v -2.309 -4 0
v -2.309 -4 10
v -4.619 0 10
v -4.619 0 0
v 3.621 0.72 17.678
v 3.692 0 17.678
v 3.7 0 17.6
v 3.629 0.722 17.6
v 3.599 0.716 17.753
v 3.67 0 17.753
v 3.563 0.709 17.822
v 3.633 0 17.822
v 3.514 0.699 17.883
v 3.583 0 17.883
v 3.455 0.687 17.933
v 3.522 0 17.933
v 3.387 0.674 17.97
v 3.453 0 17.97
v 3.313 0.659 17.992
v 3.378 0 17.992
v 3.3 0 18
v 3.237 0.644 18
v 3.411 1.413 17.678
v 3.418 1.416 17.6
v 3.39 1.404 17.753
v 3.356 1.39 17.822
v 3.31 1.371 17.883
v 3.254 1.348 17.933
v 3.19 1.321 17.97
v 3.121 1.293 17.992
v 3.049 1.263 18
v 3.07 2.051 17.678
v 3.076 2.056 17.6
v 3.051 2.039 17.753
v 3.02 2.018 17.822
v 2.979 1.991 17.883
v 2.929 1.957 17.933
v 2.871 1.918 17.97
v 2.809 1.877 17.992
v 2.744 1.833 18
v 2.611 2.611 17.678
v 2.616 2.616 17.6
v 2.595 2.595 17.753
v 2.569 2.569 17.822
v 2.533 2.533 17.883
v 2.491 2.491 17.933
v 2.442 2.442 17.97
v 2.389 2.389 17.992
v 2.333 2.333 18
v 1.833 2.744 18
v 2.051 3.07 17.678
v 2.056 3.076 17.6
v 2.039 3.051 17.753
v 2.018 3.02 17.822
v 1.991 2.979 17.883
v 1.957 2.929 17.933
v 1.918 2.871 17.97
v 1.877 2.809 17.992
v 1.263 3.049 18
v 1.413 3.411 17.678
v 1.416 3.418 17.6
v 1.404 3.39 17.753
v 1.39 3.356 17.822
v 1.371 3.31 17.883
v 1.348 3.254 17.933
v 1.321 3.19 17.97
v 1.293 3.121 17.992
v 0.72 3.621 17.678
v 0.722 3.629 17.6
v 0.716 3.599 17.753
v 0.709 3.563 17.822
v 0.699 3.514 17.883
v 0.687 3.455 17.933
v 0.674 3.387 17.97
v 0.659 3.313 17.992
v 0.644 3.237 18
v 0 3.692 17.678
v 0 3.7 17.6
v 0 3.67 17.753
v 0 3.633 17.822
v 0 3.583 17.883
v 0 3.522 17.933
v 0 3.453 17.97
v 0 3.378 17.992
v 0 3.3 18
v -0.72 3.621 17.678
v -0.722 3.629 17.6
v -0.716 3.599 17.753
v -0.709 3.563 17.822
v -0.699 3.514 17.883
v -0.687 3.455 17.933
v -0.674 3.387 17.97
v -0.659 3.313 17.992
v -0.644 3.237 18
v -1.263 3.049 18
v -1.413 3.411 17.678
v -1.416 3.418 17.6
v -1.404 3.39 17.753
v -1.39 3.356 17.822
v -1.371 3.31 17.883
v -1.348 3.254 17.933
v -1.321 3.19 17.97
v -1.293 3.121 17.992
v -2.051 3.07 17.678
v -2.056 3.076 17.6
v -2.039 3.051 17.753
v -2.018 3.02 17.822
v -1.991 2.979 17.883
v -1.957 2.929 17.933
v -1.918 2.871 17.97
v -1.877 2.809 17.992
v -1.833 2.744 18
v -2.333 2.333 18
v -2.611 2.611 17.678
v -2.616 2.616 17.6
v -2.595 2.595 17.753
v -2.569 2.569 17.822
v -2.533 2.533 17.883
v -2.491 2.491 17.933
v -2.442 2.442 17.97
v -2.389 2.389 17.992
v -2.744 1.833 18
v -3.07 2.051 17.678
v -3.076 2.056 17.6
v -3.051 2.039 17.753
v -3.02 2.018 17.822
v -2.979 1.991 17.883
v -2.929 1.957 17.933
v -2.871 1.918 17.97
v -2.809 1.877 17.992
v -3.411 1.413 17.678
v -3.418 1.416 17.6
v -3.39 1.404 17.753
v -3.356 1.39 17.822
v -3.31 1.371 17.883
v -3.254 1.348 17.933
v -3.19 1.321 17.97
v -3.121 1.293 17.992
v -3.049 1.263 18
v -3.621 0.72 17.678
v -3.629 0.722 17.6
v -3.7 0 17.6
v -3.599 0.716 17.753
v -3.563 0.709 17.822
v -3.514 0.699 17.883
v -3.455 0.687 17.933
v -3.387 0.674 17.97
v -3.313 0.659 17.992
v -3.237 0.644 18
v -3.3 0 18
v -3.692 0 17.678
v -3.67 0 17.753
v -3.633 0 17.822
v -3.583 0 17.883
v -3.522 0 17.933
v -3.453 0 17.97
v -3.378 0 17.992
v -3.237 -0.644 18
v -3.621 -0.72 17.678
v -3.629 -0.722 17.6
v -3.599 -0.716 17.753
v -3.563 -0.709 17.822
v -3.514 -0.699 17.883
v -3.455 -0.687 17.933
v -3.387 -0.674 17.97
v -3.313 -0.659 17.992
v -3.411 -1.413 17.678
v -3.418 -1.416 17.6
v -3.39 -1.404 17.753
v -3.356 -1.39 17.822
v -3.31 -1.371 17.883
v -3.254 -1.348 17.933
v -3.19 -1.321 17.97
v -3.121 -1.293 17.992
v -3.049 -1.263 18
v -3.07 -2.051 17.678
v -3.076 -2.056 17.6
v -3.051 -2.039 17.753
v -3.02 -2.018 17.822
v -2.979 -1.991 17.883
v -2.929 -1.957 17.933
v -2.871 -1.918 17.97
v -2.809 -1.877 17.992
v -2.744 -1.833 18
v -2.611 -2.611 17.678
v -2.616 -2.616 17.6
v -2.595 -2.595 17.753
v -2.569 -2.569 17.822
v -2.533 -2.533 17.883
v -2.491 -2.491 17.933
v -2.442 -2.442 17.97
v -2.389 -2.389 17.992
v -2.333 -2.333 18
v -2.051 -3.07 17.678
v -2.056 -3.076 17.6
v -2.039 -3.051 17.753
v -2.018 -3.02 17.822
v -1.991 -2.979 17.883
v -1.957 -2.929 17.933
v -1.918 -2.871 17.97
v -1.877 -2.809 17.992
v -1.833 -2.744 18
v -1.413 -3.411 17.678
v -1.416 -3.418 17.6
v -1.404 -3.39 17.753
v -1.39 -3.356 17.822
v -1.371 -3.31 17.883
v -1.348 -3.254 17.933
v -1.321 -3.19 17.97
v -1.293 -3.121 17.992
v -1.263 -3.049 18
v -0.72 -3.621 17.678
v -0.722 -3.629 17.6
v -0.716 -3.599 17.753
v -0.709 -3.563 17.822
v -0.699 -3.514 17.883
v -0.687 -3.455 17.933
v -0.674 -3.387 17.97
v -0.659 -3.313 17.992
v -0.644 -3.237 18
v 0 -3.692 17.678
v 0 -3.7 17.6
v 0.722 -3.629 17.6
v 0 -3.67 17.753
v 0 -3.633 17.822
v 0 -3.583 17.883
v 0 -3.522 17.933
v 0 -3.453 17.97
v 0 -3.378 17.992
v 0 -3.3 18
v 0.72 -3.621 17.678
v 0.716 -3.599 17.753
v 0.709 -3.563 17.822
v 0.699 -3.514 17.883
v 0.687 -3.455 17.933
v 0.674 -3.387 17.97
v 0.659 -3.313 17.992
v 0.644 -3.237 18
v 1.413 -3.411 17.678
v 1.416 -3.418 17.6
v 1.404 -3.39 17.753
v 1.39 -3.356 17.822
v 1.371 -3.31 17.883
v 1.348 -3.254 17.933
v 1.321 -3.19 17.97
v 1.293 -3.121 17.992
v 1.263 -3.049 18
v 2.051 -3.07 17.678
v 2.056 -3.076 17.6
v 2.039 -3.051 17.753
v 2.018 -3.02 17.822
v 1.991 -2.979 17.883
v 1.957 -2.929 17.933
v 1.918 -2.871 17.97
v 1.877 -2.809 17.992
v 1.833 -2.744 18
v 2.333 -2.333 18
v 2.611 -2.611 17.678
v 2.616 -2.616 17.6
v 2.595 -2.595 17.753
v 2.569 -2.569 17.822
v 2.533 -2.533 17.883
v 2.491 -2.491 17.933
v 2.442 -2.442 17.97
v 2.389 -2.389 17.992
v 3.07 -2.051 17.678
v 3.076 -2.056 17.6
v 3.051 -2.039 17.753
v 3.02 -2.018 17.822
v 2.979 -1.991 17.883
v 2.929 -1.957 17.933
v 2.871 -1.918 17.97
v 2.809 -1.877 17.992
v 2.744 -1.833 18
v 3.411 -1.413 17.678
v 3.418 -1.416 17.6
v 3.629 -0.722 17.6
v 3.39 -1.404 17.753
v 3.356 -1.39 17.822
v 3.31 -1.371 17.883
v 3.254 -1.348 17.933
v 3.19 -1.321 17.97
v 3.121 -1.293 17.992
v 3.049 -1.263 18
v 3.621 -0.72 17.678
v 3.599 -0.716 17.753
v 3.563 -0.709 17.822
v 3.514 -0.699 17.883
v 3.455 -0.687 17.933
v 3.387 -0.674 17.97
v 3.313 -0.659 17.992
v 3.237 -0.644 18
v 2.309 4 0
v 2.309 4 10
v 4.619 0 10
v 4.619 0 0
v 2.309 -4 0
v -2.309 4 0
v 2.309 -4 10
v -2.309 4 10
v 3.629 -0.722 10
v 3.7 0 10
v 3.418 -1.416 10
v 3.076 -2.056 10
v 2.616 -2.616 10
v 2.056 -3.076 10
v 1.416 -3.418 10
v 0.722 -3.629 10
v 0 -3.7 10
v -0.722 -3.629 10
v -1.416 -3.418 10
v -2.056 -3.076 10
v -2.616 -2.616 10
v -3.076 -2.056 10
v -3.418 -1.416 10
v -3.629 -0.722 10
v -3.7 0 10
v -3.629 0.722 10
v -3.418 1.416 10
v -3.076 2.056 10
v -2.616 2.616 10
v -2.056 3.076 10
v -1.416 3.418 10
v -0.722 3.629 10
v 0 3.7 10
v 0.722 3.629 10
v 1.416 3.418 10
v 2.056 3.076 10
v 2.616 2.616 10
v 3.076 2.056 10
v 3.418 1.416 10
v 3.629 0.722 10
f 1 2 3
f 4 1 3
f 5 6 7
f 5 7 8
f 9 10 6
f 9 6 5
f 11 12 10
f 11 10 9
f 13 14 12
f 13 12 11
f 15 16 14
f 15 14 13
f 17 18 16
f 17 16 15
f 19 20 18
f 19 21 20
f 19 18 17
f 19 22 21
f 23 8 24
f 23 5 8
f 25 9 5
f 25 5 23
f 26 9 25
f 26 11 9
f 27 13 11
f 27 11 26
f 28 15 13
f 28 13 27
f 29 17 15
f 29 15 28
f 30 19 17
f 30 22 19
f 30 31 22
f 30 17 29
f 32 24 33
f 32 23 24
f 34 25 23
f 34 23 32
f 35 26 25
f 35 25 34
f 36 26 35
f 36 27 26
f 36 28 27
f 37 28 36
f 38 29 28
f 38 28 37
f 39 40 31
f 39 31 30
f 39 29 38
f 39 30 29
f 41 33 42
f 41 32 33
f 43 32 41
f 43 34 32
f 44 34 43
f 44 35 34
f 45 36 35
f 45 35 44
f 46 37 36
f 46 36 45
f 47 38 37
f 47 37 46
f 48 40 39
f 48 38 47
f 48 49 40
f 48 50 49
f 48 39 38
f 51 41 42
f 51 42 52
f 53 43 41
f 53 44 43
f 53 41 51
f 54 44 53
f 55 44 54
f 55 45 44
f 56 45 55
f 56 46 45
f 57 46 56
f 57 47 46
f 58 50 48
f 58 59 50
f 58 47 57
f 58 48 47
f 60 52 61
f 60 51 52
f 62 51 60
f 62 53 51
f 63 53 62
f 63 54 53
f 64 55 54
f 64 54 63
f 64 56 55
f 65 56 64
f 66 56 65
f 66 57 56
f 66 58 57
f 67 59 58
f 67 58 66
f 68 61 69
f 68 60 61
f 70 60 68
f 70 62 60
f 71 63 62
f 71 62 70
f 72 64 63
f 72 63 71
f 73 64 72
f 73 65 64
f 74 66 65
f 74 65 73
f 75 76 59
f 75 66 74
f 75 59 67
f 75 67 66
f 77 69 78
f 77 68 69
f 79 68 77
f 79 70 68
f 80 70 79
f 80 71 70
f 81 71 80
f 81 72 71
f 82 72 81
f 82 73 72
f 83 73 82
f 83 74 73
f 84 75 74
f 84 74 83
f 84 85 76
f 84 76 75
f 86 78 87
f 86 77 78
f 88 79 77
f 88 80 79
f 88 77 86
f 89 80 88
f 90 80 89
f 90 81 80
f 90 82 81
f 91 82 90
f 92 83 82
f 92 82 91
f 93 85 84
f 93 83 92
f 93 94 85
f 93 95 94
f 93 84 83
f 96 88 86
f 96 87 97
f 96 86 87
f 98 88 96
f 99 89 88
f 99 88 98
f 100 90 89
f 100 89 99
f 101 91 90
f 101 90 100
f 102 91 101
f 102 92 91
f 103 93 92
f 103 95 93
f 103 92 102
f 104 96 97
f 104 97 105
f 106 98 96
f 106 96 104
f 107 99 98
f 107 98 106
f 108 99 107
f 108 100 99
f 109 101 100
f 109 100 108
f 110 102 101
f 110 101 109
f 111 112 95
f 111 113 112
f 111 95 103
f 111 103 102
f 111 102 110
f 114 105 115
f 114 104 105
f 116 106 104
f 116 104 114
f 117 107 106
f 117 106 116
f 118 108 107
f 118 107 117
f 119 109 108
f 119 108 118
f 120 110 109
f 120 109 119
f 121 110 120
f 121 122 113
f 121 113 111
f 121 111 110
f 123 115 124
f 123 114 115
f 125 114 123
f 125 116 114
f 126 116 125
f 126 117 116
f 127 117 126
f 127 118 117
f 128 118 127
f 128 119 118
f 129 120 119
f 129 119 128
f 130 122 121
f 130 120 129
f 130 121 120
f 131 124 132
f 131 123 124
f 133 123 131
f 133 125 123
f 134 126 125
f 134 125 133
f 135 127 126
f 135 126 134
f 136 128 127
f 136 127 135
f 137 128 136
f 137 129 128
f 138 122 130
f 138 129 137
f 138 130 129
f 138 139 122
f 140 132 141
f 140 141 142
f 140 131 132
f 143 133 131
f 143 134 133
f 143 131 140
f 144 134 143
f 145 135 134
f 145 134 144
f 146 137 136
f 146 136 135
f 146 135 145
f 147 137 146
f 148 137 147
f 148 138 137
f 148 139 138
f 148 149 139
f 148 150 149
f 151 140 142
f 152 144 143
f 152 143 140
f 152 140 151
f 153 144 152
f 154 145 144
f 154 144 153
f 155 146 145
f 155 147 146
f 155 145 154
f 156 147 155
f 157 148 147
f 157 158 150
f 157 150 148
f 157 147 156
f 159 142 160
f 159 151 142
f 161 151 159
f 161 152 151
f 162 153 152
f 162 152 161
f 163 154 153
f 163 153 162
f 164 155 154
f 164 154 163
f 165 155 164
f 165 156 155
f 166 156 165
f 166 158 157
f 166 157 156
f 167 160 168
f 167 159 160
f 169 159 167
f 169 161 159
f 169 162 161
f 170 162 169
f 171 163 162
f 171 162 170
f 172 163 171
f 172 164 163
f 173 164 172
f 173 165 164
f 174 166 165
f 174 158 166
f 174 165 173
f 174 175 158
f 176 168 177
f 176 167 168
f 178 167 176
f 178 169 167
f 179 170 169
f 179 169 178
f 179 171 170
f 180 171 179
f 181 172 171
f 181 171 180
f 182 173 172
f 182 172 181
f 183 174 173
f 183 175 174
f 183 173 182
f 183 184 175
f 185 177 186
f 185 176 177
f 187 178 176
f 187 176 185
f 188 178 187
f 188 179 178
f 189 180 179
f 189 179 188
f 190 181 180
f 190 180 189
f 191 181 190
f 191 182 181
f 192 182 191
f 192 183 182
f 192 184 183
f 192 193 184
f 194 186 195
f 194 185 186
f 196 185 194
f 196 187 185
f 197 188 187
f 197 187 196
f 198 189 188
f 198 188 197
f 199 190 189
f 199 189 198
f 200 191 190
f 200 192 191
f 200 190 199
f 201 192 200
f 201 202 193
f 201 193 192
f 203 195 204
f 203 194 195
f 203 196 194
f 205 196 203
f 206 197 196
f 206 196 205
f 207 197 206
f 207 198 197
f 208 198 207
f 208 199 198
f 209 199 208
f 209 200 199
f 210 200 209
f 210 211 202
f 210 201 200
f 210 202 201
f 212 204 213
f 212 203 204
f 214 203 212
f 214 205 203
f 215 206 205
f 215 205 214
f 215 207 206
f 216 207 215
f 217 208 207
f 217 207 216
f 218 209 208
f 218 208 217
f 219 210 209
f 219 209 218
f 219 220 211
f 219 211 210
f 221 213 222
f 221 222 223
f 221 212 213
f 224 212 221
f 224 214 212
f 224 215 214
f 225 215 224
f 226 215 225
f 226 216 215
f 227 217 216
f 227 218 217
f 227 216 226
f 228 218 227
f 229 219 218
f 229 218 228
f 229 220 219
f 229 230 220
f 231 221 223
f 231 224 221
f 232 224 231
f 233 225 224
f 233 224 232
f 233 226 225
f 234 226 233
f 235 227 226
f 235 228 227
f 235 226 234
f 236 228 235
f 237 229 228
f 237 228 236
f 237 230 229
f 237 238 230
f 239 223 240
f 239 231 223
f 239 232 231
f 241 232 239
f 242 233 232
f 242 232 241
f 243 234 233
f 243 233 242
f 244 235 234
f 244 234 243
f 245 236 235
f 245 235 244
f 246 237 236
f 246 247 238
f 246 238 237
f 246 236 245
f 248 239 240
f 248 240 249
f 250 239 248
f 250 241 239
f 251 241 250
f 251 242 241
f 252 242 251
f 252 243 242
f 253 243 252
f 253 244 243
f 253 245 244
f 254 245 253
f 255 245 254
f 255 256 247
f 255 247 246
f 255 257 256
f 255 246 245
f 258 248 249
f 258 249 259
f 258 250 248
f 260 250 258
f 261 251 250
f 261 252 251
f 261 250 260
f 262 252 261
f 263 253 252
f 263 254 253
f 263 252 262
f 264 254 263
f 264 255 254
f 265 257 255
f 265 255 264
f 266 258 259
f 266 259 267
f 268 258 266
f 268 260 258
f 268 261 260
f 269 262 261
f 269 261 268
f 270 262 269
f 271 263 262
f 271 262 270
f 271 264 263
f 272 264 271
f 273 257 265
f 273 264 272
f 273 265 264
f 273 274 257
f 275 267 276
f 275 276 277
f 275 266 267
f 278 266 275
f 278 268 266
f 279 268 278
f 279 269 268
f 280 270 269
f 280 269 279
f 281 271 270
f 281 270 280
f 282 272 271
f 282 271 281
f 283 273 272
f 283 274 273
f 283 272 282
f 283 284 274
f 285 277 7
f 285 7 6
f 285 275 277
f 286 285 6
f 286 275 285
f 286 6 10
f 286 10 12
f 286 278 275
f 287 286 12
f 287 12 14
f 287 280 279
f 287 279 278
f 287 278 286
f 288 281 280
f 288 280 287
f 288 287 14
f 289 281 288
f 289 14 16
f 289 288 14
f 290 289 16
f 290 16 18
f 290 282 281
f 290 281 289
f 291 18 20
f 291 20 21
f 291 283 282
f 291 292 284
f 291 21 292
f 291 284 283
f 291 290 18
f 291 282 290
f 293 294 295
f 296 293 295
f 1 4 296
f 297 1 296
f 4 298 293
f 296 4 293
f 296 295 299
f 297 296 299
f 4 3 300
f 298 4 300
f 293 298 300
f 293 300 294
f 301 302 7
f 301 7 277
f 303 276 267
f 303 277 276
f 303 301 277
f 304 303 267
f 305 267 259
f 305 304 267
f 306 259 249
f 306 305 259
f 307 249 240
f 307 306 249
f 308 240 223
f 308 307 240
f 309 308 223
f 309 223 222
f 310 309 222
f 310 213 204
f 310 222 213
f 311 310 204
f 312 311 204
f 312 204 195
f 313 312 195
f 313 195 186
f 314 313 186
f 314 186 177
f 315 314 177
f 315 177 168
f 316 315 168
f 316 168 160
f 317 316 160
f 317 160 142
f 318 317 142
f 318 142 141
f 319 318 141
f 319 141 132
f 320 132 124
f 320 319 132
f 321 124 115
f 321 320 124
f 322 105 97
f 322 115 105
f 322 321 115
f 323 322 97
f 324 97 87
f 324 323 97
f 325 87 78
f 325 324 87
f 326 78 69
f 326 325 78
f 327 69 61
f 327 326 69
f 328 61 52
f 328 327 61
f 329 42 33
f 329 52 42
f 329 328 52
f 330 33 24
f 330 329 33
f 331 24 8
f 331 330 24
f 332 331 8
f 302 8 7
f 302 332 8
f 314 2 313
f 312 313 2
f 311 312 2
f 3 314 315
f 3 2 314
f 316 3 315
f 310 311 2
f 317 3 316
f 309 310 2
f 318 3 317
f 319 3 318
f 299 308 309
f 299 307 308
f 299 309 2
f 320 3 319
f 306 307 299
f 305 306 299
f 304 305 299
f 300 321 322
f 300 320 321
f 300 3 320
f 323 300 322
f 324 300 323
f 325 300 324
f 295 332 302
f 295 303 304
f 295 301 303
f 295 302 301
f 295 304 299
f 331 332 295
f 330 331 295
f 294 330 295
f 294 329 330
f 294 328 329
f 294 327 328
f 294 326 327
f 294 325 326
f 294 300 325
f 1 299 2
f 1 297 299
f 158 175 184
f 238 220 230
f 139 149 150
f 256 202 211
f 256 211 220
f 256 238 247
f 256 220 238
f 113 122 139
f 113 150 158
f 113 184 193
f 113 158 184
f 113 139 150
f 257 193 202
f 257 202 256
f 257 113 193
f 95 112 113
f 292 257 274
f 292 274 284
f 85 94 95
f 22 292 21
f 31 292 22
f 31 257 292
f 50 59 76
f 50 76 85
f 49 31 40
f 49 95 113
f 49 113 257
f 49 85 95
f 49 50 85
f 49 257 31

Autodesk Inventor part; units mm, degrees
ref_plane "YZ Plane" through (0, 0, 0) normal (1, 0, 0) x (0, 1, 0)
ref_plane "XZ Plane" through (0, 0, 0) normal (0, 1, 0) x (-1, 0, 0)
ref_plane "XY Plane" through (0, 0, 0) normal (0, 0, 1) x (1, 0, 0)
sketch "Sketch1" plane through (0, 0, 0) normal (0, 0, 1) x (1, 0, 0)
  line L0 (2.3094, -4) -> (-2.3094, -4)
  line L1 (-2.3094, -4) -> (-4.6188, 0)
  line L2 (-4.6188, 0) -> (-2.3094, 4)
  line L3 (-2.3094, 4) -> (2.3094, 4)
  line L4 (2.3094, 4) -> (4.6188, 0)
  line L5 (4.6188, 0) -> (2.3094, -4)
  point P0 (0, 0)
  point P1 (0, 0)
  dimension "d0" = 8
extrude "Extrusion1" add sketch "Sketch1" along normal blind 10
sketch "Sketch2" plane through (0, 0, 10) normal (0, 0, 1) x (1, 0, 0)
  circle A0 centre (0, 0) radius 3.7
  dimension "d3" = 7.4
extrude "Extrusion2" add sketch "Sketch2" along normal blind 8
fillet "Fillet1" radius 0.4 1 edges at (-3.7, 0, 18)
properties part number "hex_shaft"
